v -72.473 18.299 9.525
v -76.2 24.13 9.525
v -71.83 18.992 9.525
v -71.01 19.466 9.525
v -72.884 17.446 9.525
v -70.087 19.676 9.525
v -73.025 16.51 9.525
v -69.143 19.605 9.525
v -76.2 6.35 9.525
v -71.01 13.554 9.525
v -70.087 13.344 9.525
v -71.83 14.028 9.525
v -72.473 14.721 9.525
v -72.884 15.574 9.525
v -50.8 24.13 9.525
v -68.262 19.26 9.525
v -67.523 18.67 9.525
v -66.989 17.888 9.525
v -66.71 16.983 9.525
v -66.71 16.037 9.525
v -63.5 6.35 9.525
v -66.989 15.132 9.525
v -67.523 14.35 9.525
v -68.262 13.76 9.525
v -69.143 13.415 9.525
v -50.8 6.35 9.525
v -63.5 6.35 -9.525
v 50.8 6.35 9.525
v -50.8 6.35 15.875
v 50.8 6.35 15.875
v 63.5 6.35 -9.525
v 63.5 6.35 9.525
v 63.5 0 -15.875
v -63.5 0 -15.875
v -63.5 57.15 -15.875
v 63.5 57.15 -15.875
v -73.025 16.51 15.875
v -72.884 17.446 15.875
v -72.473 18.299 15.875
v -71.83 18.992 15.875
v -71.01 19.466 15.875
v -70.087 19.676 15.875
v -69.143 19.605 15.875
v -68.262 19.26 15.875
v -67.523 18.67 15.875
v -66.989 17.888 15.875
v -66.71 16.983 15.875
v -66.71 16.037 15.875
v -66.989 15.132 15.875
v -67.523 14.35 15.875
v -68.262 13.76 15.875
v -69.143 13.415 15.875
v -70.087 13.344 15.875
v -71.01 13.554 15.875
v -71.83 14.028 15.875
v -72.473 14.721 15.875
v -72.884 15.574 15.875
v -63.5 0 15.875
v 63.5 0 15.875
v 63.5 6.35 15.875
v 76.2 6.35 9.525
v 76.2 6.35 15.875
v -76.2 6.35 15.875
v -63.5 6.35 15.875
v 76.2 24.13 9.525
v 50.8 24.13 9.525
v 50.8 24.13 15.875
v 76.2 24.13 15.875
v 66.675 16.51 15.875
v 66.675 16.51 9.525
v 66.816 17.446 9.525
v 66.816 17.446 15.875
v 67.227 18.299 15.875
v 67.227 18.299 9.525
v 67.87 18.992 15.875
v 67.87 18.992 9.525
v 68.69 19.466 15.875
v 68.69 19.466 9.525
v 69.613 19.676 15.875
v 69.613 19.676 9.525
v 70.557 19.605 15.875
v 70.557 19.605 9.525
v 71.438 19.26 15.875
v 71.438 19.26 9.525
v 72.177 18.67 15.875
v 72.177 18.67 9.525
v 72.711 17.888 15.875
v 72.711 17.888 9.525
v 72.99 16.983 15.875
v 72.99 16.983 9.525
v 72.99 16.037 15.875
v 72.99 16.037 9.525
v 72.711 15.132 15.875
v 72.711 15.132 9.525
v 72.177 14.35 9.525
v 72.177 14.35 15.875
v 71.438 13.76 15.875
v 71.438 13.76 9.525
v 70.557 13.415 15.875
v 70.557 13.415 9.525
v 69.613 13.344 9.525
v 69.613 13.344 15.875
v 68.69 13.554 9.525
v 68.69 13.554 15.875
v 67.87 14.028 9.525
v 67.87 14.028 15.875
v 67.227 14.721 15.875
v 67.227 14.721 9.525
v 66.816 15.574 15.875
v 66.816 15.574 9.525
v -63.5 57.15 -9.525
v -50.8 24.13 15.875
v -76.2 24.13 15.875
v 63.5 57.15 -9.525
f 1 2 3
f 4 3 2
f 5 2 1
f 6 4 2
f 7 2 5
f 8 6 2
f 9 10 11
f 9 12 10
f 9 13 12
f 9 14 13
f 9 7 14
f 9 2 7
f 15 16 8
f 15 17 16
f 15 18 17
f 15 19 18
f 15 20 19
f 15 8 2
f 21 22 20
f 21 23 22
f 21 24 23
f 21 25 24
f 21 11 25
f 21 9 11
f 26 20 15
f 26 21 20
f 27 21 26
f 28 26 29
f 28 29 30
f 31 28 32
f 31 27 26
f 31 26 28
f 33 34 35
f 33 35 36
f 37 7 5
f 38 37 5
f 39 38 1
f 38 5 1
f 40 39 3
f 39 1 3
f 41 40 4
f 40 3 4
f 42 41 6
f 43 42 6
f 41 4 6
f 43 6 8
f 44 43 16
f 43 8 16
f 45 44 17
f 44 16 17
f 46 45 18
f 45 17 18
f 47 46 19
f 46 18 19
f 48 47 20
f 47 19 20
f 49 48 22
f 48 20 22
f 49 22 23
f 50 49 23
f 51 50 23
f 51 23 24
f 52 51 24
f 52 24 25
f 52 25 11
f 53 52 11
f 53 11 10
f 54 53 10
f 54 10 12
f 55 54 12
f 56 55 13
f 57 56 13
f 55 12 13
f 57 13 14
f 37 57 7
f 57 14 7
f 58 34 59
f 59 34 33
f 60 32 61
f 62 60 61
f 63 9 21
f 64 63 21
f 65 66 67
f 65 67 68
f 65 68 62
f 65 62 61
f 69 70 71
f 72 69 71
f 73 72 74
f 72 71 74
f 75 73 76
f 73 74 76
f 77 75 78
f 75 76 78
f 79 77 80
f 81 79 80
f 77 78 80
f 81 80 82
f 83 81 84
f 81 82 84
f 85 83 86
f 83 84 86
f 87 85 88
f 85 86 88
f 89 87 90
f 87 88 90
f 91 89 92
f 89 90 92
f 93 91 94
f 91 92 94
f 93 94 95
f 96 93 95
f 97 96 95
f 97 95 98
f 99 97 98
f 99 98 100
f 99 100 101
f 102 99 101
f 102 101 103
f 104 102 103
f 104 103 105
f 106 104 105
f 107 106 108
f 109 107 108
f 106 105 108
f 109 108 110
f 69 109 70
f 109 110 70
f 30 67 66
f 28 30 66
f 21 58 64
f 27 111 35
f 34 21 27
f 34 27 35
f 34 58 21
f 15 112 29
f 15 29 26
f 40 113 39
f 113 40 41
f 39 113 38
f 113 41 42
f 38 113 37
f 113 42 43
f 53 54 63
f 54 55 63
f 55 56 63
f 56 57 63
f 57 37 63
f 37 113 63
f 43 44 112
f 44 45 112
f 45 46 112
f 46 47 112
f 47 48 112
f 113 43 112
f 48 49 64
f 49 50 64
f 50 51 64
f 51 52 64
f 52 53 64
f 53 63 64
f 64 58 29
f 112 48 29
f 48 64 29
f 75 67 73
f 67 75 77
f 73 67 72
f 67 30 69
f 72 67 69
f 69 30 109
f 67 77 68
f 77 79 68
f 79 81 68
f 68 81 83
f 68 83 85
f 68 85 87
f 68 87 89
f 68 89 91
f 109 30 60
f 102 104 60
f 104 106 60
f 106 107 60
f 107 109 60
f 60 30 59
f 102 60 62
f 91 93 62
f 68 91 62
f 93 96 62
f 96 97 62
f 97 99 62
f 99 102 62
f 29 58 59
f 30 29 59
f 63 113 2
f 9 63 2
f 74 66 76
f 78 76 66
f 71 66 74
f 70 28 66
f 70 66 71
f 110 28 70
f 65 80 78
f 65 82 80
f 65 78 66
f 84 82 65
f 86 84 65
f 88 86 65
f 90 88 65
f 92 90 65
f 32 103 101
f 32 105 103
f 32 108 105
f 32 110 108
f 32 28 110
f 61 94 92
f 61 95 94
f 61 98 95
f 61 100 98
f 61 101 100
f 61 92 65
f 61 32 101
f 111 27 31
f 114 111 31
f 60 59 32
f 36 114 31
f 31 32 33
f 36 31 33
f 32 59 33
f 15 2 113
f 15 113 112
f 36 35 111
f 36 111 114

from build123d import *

# Parameters (mm, degrees)
SKETCH1_W           = 127
SKETCH1_H           = 31.75
BOSS_EXTRUDE1_DEPTH = 6.35
SKETCH2_W           = 25.4
SKETCH2_H           = 6.35
BOSS_EXTRUDE2_DEPTH = 17.78
SKETCH3_R           = 3.175
CUT_EXTRUDE1_DEPTH  = 6.35
SKETCH4_W           = 127
SKETCH4_H           = 6.35
BOSS_EXTRUDE3_DEPTH = 50.8


with BuildPart() as part:
    # Sketch1 → Boss-Extrude1 (new body)
    with BuildSketch(Plane(origin=(0, 0, 0), x_dir=(1, 0, 0), z_dir=(0, 1, 0))):
        Rectangle(SKETCH1_W, SKETCH1_H)
    extrude(amount=BOSS_EXTRUDE1_DEPTH)

    # Sketch2 → Boss-Extrude2 (add)
    with BuildSketch(Plane(origin=(0, 6.35, 0), x_dir=(1, 0, 0), z_dir=(0, 1, 0))):
        with Locations((-63.5, -12.7)):
            Rectangle(SKETCH2_W, SKETCH2_H)
        with Locations((63.5, -12.7)):
            Rectangle(SKETCH2_W, SKETCH2_H)
    extrude(amount=BOSS_EXTRUDE2_DEPTH)

    # Sketch3 → Cut-Extrude1 (cut)
    with BuildSketch(Plane(origin=(0, 0, 9.525), x_dir=(-1, 0, 0), z_dir=(0, 0, -1))):
        with Locations((69.85, 16.51)):
            Circle(SKETCH3_R)
        with Locations((-69.85, 16.51)):
            Circle(SKETCH3_R)
    extrude(amount=-CUT_EXTRUDE1_DEPTH, mode=Mode.SUBTRACT)

    # Sketch4 → Boss-Extrude3 (add)
    with BuildSketch(Plane(origin=(0, 6.35, 0), x_dir=(1, 0, 0), z_dir=(0, 1, 0))):
        with Locations((0, 12.7)):
            Rectangle(SKETCH4_W, SKETCH4_H)
    extrude(amount=BOSS_EXTRUDE3_DEPTH)


solid = part.part
